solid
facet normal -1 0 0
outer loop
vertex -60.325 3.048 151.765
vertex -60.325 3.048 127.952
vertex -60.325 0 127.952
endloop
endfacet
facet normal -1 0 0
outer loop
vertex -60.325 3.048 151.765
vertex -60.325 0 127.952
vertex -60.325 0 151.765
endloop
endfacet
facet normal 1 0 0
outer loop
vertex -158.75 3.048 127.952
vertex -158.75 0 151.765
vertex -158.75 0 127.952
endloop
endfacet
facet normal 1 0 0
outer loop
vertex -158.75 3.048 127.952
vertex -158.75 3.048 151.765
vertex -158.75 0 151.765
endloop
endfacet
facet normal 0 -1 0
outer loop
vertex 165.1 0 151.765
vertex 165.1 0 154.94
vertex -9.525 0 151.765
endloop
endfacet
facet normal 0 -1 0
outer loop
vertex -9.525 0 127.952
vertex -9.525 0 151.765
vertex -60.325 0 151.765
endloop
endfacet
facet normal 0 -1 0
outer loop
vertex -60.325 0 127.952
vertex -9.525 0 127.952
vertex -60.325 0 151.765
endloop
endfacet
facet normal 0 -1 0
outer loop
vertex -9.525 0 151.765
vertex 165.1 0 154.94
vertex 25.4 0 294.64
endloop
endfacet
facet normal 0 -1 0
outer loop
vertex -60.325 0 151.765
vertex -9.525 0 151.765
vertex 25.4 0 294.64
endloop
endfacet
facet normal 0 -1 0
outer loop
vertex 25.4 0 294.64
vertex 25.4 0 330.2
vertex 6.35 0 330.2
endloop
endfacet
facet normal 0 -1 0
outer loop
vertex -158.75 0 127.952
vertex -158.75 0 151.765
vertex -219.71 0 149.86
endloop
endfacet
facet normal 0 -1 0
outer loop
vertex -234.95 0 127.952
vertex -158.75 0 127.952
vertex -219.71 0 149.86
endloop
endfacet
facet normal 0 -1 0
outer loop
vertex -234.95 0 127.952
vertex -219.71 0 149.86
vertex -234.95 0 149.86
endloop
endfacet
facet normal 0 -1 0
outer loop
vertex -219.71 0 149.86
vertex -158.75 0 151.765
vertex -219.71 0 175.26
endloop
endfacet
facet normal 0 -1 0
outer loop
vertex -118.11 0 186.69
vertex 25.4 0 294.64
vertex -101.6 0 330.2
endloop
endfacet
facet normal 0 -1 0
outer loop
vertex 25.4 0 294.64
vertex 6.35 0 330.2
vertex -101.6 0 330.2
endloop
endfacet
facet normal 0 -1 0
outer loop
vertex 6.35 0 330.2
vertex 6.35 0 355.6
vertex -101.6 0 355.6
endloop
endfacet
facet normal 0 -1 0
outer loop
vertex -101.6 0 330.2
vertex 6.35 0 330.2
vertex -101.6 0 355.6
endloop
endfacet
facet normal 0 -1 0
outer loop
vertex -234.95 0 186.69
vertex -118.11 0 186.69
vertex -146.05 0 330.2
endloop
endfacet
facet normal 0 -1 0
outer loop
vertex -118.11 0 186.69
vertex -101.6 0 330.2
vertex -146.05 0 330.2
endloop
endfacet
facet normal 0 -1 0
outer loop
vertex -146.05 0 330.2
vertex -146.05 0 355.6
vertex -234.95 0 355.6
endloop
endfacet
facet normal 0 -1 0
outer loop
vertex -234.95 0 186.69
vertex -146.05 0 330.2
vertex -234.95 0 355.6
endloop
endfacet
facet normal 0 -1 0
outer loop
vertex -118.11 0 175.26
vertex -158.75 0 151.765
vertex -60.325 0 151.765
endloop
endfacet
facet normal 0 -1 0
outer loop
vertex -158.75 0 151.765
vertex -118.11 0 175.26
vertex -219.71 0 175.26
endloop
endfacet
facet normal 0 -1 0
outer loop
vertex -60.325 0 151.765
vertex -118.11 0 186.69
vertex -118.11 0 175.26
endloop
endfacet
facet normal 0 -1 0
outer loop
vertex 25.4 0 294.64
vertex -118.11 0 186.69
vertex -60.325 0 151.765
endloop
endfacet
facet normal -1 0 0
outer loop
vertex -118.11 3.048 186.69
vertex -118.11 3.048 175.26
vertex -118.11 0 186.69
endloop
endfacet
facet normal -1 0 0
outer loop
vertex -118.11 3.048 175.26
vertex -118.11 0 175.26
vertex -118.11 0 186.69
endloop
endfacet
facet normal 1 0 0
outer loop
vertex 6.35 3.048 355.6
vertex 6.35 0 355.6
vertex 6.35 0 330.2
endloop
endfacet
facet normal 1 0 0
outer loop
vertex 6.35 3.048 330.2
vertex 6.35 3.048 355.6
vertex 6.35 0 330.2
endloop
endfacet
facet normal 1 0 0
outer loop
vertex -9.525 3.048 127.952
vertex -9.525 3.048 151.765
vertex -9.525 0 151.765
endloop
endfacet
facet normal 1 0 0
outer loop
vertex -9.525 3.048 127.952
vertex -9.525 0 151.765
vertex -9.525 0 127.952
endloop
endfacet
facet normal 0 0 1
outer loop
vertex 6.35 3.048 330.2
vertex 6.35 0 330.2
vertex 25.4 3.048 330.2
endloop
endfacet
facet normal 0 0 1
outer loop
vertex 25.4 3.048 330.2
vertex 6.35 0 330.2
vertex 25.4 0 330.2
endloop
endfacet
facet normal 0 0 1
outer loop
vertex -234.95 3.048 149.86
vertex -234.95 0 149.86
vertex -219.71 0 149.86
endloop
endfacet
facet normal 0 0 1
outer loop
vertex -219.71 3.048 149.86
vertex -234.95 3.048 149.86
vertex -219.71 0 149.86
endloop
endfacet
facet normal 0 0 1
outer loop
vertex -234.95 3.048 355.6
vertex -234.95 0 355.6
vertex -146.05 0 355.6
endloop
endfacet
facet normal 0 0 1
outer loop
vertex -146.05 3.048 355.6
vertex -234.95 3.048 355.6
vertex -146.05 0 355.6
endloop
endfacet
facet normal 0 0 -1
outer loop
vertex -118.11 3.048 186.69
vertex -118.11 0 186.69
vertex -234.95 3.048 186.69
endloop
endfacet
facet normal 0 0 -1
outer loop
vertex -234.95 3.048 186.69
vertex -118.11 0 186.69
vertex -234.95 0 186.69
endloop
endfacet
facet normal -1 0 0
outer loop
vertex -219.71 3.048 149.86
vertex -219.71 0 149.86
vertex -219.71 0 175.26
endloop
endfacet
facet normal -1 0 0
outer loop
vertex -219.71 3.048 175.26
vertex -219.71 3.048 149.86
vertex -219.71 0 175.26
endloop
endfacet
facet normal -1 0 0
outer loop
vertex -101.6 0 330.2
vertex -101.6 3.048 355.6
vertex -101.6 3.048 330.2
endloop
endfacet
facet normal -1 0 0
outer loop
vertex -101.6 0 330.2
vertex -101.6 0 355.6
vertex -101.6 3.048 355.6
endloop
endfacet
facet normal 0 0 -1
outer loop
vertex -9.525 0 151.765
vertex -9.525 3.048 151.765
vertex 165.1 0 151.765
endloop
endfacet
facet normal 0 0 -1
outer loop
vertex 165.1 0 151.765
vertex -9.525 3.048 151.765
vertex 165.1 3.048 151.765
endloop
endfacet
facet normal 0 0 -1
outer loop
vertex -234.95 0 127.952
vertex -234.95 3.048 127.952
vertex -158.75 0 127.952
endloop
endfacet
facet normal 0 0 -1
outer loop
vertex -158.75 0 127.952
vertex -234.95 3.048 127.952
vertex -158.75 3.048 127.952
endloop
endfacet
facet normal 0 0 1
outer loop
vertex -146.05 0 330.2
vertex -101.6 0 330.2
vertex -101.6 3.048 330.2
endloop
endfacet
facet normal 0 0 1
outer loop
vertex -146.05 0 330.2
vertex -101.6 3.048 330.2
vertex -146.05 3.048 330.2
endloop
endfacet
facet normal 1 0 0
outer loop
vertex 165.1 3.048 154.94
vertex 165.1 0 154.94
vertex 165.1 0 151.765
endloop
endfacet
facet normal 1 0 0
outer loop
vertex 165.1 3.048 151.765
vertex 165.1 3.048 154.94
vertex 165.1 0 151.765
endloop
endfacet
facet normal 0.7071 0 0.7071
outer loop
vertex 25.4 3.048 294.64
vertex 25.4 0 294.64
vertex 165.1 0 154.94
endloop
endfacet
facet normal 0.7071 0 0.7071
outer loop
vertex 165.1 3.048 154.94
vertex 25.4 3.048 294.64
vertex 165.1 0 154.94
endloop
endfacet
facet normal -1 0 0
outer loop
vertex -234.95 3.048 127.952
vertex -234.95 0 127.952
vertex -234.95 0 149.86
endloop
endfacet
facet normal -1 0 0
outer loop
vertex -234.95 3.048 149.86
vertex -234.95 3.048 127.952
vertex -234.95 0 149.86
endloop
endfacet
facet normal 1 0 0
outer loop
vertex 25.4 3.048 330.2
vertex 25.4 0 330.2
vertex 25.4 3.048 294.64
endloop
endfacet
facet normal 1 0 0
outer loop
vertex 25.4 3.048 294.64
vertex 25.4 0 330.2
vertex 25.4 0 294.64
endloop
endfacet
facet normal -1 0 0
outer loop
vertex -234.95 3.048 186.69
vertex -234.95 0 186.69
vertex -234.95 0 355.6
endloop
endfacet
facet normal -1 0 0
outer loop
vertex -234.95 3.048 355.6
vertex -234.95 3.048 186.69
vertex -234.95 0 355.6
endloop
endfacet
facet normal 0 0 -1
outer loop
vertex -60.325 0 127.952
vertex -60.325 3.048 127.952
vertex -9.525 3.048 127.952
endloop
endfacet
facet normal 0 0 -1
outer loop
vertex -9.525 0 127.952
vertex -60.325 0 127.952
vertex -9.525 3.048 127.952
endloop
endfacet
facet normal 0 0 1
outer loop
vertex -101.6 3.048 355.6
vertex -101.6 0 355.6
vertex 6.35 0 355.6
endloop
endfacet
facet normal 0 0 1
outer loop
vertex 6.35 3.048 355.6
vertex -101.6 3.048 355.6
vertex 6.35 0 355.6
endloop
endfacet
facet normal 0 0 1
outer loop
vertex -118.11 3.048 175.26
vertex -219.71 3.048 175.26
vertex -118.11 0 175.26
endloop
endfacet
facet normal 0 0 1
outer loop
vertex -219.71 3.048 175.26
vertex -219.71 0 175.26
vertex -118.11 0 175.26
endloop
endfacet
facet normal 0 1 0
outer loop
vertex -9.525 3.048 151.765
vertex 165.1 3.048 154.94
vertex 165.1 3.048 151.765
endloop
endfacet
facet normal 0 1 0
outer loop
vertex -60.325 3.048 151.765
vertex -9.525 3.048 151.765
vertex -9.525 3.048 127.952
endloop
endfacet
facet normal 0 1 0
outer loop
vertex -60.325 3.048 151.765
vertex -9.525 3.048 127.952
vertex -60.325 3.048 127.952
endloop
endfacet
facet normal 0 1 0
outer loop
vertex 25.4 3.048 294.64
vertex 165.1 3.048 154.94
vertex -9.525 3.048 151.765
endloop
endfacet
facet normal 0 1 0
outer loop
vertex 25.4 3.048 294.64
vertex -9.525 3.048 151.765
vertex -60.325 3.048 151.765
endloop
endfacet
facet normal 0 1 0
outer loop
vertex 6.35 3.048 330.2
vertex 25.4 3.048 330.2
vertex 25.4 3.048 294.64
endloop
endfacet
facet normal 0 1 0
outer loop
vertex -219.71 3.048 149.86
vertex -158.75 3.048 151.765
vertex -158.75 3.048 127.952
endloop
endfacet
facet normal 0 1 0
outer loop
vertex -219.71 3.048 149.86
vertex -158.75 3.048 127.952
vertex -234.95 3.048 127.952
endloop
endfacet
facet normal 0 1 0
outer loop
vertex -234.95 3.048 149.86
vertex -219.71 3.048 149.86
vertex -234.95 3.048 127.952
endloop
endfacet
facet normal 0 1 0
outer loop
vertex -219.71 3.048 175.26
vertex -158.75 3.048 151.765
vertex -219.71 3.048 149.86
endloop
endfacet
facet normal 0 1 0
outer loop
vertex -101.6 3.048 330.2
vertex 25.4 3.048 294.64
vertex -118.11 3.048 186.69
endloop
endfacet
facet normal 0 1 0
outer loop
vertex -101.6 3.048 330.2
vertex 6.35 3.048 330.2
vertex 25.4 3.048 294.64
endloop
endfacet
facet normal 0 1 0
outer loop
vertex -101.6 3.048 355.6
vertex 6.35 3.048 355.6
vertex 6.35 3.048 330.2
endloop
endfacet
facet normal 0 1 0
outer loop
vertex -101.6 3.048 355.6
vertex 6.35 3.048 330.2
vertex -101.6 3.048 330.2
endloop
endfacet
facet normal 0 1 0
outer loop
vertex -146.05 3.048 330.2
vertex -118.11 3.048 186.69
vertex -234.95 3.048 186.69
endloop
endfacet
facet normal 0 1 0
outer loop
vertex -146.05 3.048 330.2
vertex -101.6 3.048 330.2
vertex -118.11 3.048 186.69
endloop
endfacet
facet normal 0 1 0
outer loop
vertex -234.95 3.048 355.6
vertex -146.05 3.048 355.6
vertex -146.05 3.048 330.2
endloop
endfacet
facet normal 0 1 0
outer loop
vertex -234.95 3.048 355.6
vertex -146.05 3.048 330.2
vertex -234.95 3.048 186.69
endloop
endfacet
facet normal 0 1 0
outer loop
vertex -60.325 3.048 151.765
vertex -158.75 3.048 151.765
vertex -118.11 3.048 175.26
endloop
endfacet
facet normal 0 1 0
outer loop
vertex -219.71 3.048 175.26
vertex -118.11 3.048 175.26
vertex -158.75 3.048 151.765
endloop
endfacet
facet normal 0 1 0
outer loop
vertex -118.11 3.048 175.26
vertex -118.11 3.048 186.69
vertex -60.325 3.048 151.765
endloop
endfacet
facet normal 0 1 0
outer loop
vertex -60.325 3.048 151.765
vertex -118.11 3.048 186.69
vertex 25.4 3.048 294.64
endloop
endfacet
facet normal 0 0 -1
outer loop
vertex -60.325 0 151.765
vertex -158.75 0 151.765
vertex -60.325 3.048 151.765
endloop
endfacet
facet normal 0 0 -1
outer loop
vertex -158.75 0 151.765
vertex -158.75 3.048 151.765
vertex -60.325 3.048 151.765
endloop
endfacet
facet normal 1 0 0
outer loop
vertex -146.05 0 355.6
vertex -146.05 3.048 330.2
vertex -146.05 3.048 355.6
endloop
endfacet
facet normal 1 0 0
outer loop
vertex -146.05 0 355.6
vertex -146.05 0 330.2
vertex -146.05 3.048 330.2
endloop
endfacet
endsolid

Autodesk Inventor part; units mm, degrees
ref_plane "YZ Plane" through (0, 0, 0) normal (1, 0, 0) x (0, 1, 0)
ref_plane "XZ Plane" through (0, 0, 0) normal (0, 1, 0) x (-1, 0, 0)
ref_plane "XY Plane" through (0, 0, 0) normal (0, 0, 1) x (1, 0, 0)
sketch "Sketch1" plane through (0, 0, 0) normal (0, 1, 0) x (-1, 0, 0)
  line L0 (234.95, 355.6) -> (-234.95, 355.6)
  line L1 (-234.95, 355.6) -> (-234.95, -355.6)
  line L2 (-234.95, -355.6) -> (234.95, -355.6)
  line L3 (234.95, -355.6) -> (234.95, 355.6)
  line L4 (234.95, 355.6) -> (-234.95, -355.6) construction
  line L5 (-234.95, 355.6) -> (234.95, -355.6) construction
  point P0 (0, 0)
  dimension "d0" = 469.9
  dimension "d1" = 711.2
extrude "Plate1" add sketch "Sketch1" along normal blind 3.048
sketch "Sketch3" plane through (0, 3.048, 0) normal (0, 1, 0) x (1, 0, 0)
  line L0 (234.95, -355.6) -> (-234.95, -355.6) projected
  point P0 (0, 0)
sketch "Sketch4" plane through (0, 0, 0) normal (0, -1, 0) x (1, 0, 0)
  line L0 (-234.95, 355.6) -> (234.95, 355.6) projected
  line L1 (-234.95, -355.6) -> (-234.95, 355.6) projected
  line L2 (234.95, -355.6) -> (-234.95, -355.6) projected
  line L3 (234.95, 355.6) -> (234.95, -355.6) projected
  line L4 (-234.95, 355.6) -> (234.95, 355.6) projected
  line L5 (25.4, 355.6) -> (25.4, 294.64)
  line L6 (165.1, 101.6) -> (234.95, 101.6)
  line L7 (234.95, 355.6) -> (234.95, -355.6) projected
  line L8 (25.4, 294.64) -> (165.1, 154.94)
  line L9 (25.4, 294.64) -> (222.9656, 294.64) construction
  line L10 (165.1, 154.94) -> (165.1, 101.6)
  line L11 (234.95, 0) -> (-234.95, 0)
  line L12 (-234.95, -355.6) -> (-234.95, 355.6) projected
  line L13 (25.4, -355.6) -> (25.4, -294.64)
  line L14 (165.1, -127) -> (234.95, -127)
  line L15 (25.4, -294.64) -> (165.1, -154.94)
  line L16 (25.4, -294.64) -> (222.9656, -294.64) construction
  line L17 (165.1, -154.94) -> (165.1, -127)
  line L18 (-234.95, 184.15) -> (-120.65, 184.15)
  line L19 (-120.65, 184.15) -> (-120.65, 177.8)
  line L20 (-120.65, 177.8) -> (-222.25, 177.8)
  line L21 (-222.25, 177.8) -> (-222.25, 152.4)
  line L22 (-222.25, 152.4) -> (-234.95, 152.4)
  line L23 (-234.95, 149.86) -> (-219.71, 149.86)
  line L24 (-219.71, 149.86) -> (-219.71, 175.26)
  line L25 (-219.71, 175.26) -> (-118.11, 175.26)
  line L26 (-118.11, 175.26) -> (-118.11, 186.69)
  line L27 (-118.11, 186.69) -> (-234.95, 186.69)
  line L28 (165.1, -129.54) -> (20.32, -129.54)
  line L29 (20.32, -129.54) -> (20.32, 88.9)
  line L30 (20.32, 88.9) -> (165.1, 88.9)
  line L31 (165.1, 101.6) -> (165.1, 88.9)
  line L32 (-234.95, -184.15) -> (-120.65, -184.15)
  line L33 (-120.65, -184.15) -> (-120.65, -177.8)
  line L34 (-120.65, -177.8) -> (-222.25, -177.8)
  line L35 (-222.25, -177.8) -> (-222.25, -152.4)
  line L36 (-222.25, -152.4) -> (-234.95, -152.4)
  line L37 (-234.95, -149.86) -> (-219.71, -149.86)
  line L38 (-219.71, -149.86) -> (-219.71, -175.26)
  line L39 (-219.71, -175.26) -> (-118.11, -175.26)
  line L40 (-118.11, -175.26) -> (-118.11, -186.69)
  line L41 (-118.11, -186.69) -> (-234.95, -186.69)
  line L42 (-158.75, 35.56) -> (-158.75, -43.18)
  line L43 (-158.75, -43.18) -> (-234.95, -43.18)
  line L44 (-158.75, 35.56) -> (-234.95, 35.56)
  line L45 (25.4, 330.2) -> (6.35, 330.2)
  line L46 (6.35, 330.2) -> (6.35, 355.6)
  line L47 (25.4, -330.2) -> (6.35, -330.2)
  line L48 (6.35, -330.2) -> (6.35, -355.6)
  line L49 (234.95, -355.6) -> (-234.95, -355.6) projected
  point P0 (0, 0)
  dimension "d3" = 209.55
  dimension "d4" = 254
  dimension "d5" = 45
  dimension "d6" = 60.96
  dimension "d9" = 69.85
  dimension "d12" = 45
  dimension "d13" = 209.55
  dimension "d14" = 228.6
  dimension "d15" = 69.85
  dimension "d16" = 60.96
  dimension "d17" = 171.45
  dimension "d18" = 114.3
  dimension "d19" = 6.35
  dimension "d21" = 101.6
  dimension "d22" = 25.4
  dimension "d23" = 2.54
  dimension "d26" = 144.78
  dimension "d31" = 12.7
  dimension "d32" = 114.3
  dimension "d33" = 171.45
  dimension "d34" = 6.35
  dimension "d35" = 101.6
  dimension "d36" = 25.4
  dimension "d37" = 2.54
  dimension "d38" = 76.2
  dimension "d39" = 35.56
  dimension "d40" = 43.18
  dimension "d41" = 2.54
  dimension "d42" = 25.4
  dimension "d43" = 19.05
  dimension "d44" = 25.4
  dimension "d45" = 19.05
extrude "Cut1" cut sketch "Sketch4" against normal blind 3.048 contours L27 L26 L25 L24 L23 L1 L22 L21 L20 L19 L18 | L0 L3 L6 L10 L8 L5 | L18 L19 L20 L21 L22 L1 | L3 L11 L29 L30 L31 L6 | L3 L14 L17 L28 L29 L11 | L44 L42 L11 L1 | L3 L2 L13 L15 L17 L14 | L11 L42 L43 L1 | L37 L38 L39 L40 L41 L1 L32 L33 L34 L35 L36 | L36 L35 L34 L33 L32 L1
sketch "Sketch5" plane through (0, 0, 0) normal (0, -1, 0) x (1, 0, 0)
  line L0 (25.4, 355.6) -> (25.4, 294.64) projected
  line L1 (25.4, 294.64) -> (165.1, 154.94) projected
  line L2 (165.1, 154.94) -> (165.1, 88.9) projected
  line L3 (165.1, 88.9) -> (20.32, 88.9) projected
  line L4 (20.32, 88.9) -> (20.32, -129.54) projected
  line L5 (20.32, -129.54) -> (165.1, -129.54) projected
  line L6 (165.1, -129.54) -> (165.1, -154.94) projected
  line L7 (165.1, -154.94) -> (25.4, -294.64) projected
  line L8 (25.4, -294.64) -> (25.4, -355.6) projected
  line L9 (25.4, -355.6) -> (-234.95, -355.6) projected
  line L10 (-234.95, -355.6) -> (-234.95, -186.69) projected
  line L11 (-234.95, -186.69) -> (-118.11, -186.69) projected
  line L12 (-118.11, -186.69) -> (-118.11, -175.26) projected
  line L13 (-118.11, -175.26) -> (-219.71, -175.26) projected
  line L14 (-219.71, -175.26) -> (-219.71, -149.86) projected
  line L15 (-219.71, -149.86) -> (-234.95, -149.86) projected
  line L16 (-234.95, -149.86) -> (-234.95, -43.18) projected
  line L17 (-234.95, -43.18) -> (-158.75, -43.18) projected
  line L18 (-158.75, -43.18) -> (-158.75, 35.56) projected
  line L19 (-158.75, 35.56) -> (-234.95, 35.56) projected
  line L20 (-234.95, 35.56) -> (-234.95, 149.86) projected
  line L21 (-234.95, 149.86) -> (-219.71, 149.86) projected
  line L22 (-219.71, 149.86) -> (-219.71, 175.26) projected
  line L23 (-219.71, 175.26) -> (-118.11, 175.26) projected
  line L24 (-118.11, 175.26) -> (-118.11, 186.69) projected
  line L25 (-118.11, 186.69) -> (-234.95, 186.69) projected
  line L26 (-234.95, 186.69) -> (-234.95, 355.6) projected
  line L27 (-234.95, 355.6) -> (25.4, 355.6) projected
  line L28 (25.4, -355.6) -> (-234.95, -355.6) projected
  line L29 (25.4, -355.6) -> (6.35, -355.6)
  line L30 (6.35, -355.6) -> (6.35, -330.2)
  line L31 (6.35, -330.2) -> (25.4, -330.2)
  line L32 (25.4, -330.2) -> (25.4, -355.6)
  line L33 (-234.95, 355.6) -> (25.4, 355.6) projected
  line L34 (25.4, 355.6) -> (6.35, 355.6)
  line L35 (6.35, 355.6) -> (6.35, 330.2)
  line L36 (6.35, 330.2) -> (25.4, 330.2)
  line L37 (25.4, 330.2) -> (25.4, 355.6)
  line L38 (-146.05, -355.6) -> (-101.6, -355.6)
  line L39 (-101.6, -355.6) -> (-101.6, -330.2)
  line L40 (-101.6, -330.2) -> (-146.05, -330.2)
  line L41 (-146.05, -330.2) -> (-146.05, -355.6)
  line L42 (-146.05, 355.6) -> (-101.6, 355.6)
  line L43 (-101.6, 355.6) -> (-101.6, 330.2)
  line L44 (-101.6, 330.2) -> (-146.05, 330.2)
  line L45 (-146.05, 330.2) -> (-146.05, 355.6)
  point P0 (0, 0)
  dimension "d46" = 19.05
  dimension "d47" = 25.4
  dimension "d48" = 19.05
  dimension "d49" = 25.4
  dimension "d52" = 44.45
  dimension "d53" = 25.4
  dimension "d54" = 88.9
  dimension "d55" = 44.45
  dimension "d56" = 25.4
  dimension "d57" = 88.9
extrude "Cut2" cut sketch "Sketch5" against normal blind 3.048 contours L0 L36 L35 L27 | L43 L44 L45 L27 | L8 L9 L30 L31 | L9 L41 L40 L39
sketch "Sketch6" plane through (0, 3.048, 0) normal (0, 1, 0) x (1, 0, 0)
  line L0 (20.32, -88.9) -> (165.1, -88.9) projected
  line L1 (165.1, -88.9) -> (165.1, -154.94) projected
  line L2 (165.1, -154.94) -> (25.4, -294.64) projected
  line L3 (25.4, -294.64) -> (25.4, -330.2) projected
  line L4 (25.4, -330.2) -> (6.35, -330.2) projected
  line L5 (6.35, -330.2) -> (6.35, -355.6) projected
  line L6 (6.35, -355.6) -> (-101.6, -355.6) projected
  line L7 (-101.6, -355.6) -> (-101.6, -330.2) projected
  line L8 (-101.6, -330.2) -> (-146.05, -330.2) projected
  line L9 (-146.05, -330.2) -> (-146.05, -355.6) projected
  line L10 (-146.05, -355.6) -> (-234.95, -355.6) projected
  line L11 (-234.95, -355.6) -> (-234.95, -186.69) projected
  line L12 (-234.95, -186.69) -> (-118.11, -186.69) projected
  line L13 (-118.11, -186.69) -> (-118.11, -175.26) projected
  line L14 (-118.11, -175.26) -> (-219.71, -175.26) projected
  line L15 (-219.71, -175.26) -> (-219.71, -149.86) projected
  line L16 (-219.71, -149.86) -> (-234.95, -149.86) projected
  line L17 (-234.95, -149.86) -> (-234.95, -35.56) projected
  line L18 (-234.95, -35.56) -> (-158.75, -35.56) projected
  line L19 (-158.75, -35.56) -> (-158.75, 43.18) projected
  line L20 (-158.75, 43.18) -> (-234.95, 43.18) projected
  line L21 (-234.95, 43.18) -> (-234.95, 149.86) projected
  line L22 (-234.95, 149.86) -> (-219.71, 149.86) projected
  line L23 (-219.71, 149.86) -> (-219.71, 175.26) projected
  line L24 (-219.71, 175.26) -> (-118.11, 175.26) projected
  line L25 (-118.11, 175.26) -> (-118.11, 186.69) projected
  line L26 (-118.11, 186.69) -> (-234.95, 186.69) projected
  line L27 (-234.95, 186.69) -> (-234.95, 355.6) projected
  line L28 (-234.95, 355.6) -> (-146.05, 355.6) projected
  line L29 (-146.05, 355.6) -> (-146.05, 330.2) projected
  line L30 (-146.05, 330.2) -> (-101.6, 330.2) projected
  line L31 (-101.6, 330.2) -> (-101.6, 355.6) projected
  line L32 (-101.6, 355.6) -> (6.35, 355.6) projected
  line L33 (6.35, 355.6) -> (6.35, 330.2) projected
  line L34 (6.35, 330.2) -> (25.4, 330.2) projected
  line L35 (25.4, 330.2) -> (25.4, 294.64) projected
  line L36 (25.4, 294.64) -> (165.1, 154.94) projected
  line L37 (165.1, 154.94) -> (165.1, 129.54) projected
  line L38 (165.1, 129.54) -> (20.32, 129.54) projected
  line L39 (20.32, 129.54) -> (20.32, -88.9) projected
  line L40 (-234.95, -151.765) -> (-158.75, -151.765)
  line L41 (-158.75, -151.765) -> (-158.75, -126.365)
  line L42 (-158.75, -126.365) -> (-234.95, -126.365)
  line L43 (-234.95, -126.365) -> (-234.95, -151.765)
  line L44 (-234.95, -151.765) -> (-158.75, -126.365) construction
  line L45 (-158.75, -151.765) -> (-234.95, -126.365) construction
  line L46 (88.9, -151.765) -> (165.1, -151.765)
  line L47 (165.1, -151.765) -> (165.1, -126.365)
  line L48 (165.1, -126.365) -> (88.9, -126.365)
  line L49 (88.9, -126.365) -> (88.9, -151.765)
  line L50 (88.9, -151.765) -> (165.1, -126.365) construction
  line L51 (165.1, -151.765) -> (88.9, -126.365) construction
  line L52 (165.1, -154.94) -> (165.1, -88.9) projected
  line L53 (-234.95, -149.86) -> (-234.95, -35.56) projected
  line L54 (88.9, 127.635) -> (165.1, 127.635)
  line L55 (165.1, 127.635) -> (165.1, 153.035)
  line L56 (165.1, 153.035) -> (88.9, 153.035)
  line L57 (88.9, 153.035) -> (88.9, 127.635)
  line L58 (88.9, 127.635) -> (165.1, 153.035) construction
  line L59 (165.1, 127.635) -> (88.9, 153.035) construction
  line L60 (-60.325, 127.635) -> (-9.525, 127.635)
  line L61 (-9.525, 127.635) -> (-9.525, 153.035)
  line L62 (-9.525, 153.035) -> (-60.325, 153.035)
  line L63 (-60.325, 153.035) -> (-60.325, 127.635)
  line L64 (-60.325, 127.635) -> (-9.525, 153.035) construction
  line L65 (-9.525, 127.635) -> (-60.325, 153.035) construction
  line L66 (-60.325, -151.765) -> (-9.525, -151.765)
  line L67 (-9.525, -151.765) -> (-9.525, -126.365)
  line L68 (-9.525, -126.365) -> (-60.325, -126.365)
  line L69 (-60.325, -126.365) -> (-60.325, -151.765)
  line L70 (-60.325, -151.765) -> (-9.525, -126.365) construction
  line L71 (-9.525, -151.765) -> (-60.325, -126.365) construction
  line L72 (-196.85, -139.065) -> (127, -139.065) construction
  line L73 (-234.95, 127.635) -> (-158.75, 127.635)
  line L74 (-158.75, 127.635) -> (-158.75, 153.035)
  line L75 (-158.75, 153.035) -> (-234.95, 153.035)
  line L76 (-234.95, 153.035) -> (-234.95, 127.635)
  line L77 (-234.95, 127.635) -> (-158.75, 153.035) construction
  line L78 (-158.75, 127.635) -> (-234.95, 153.035) construction
  line L79 (-158.75, -151.765) -> (88.9, -151.765)
  line L80 (88.9, 153.035) -> (-158.75, 153.035)
  line L81 (-158.75, -126.365) -> (88.9, -126.365)
  line L82 (-158.75, 127.635) -> (88.9, 127.635)
  line L83 (165.1, 129.54) -> (20.32, 129.54) construction
  line L84 (-6.35, -151.765) -> (-6.35, -126.365)
  line L85 (85.725, -151.765) -> (85.725, -126.365)
  line L86 (-155.575, -151.765) -> (-155.575, -126.365)
  line L87 (-63.5, -151.765) -> (-63.5, -126.365)
  line L88 (-63.5, 127.635) -> (-63.5, 153.035)
  line L89 (-6.35, 127.635) -> (-6.35, 153.035)
  line L90 (85.725, 127.635) -> (85.725, 153.035)
  line L91 (-155.575, 127.635) -> (-155.575, 153.035)
  line L92 (-234.95, -35.56) -> (-234.95, -149.86) construction
  line L93 (-234.95, -127.9525) -> (165.1, -127.9525)
  line L94 (165.1, -88.9) -> (165.1, -154.94) construction
  point P0 (0, 0)
  point P1 (127, 140.335)
  point P2 (-34.925, 140.335)
  point P3 (-34.925, -139.065)
  point P4 (-34.925, -139.065)
  point P5 (-196.85, 140.335)
  point P6 (-9.525, -151.765)
  point P7 (-219.71, -151.765)
  point P8 (-60.325, -126.365)
  point P9 (-60.325, -126.365)
  point P10 (-158.75, -127.9525)
  point P11 (-60.325, -127.9525)
  point P12 (-9.525, -127.9525)
  dimension "d58" = 25.4
  dimension "d59" = 3.175
  dimension "d60" = 76.2
  dimension "d61" = 50.8
  dimension "d62" = 279.4
  dimension "d65" = 3.175
  dimension "d66" = 3.175
  dimension "d67" = 3.175
  dimension "d68" = 3.175
  dimension "d69" = 3.175
  dimension "d70" = 3.175
  dimension "d71" = 3.175
  dimension "d72" = 3.175
  dimension "d73" = 1.5875
extrude "Extrusion1" cut sketch "Sketch6" against normal through all contours L0 L1 L48 L81 L68 L42 L17 L18 L19 L20 L21 L73 L82 L60 L39 | L82 L89 L80 L90 L38 L39 | L1 L93 L49 L48 | L82 L61 L80 L89 | L1 L46 L49 L93 | L49 L93 L85 L81 | L90 L80 L57 L38 | L60 L63 L62 L61 | L80 L62 L75 L23 L24 L25 L26 L27 L28 L29 L30 L31 L32 L33 L34 L35 L36 L37 L56 | L49 L79 L85 L93 | L85 L93 L84 L81 | L57 L56 L37 L38 | L82 L88 L80 L63 | L85 L79 L84 L93 | L84 L93 L67 L81 | L82 L91 L80 L88 | L84 L79 L67 L93 | L67 L93 L69 L68 | L82 L74 L80 L91 | L69 L93 L87 L81 | L73 L21 L22 L23 L75 L74 | L69 L79 L87 L93 | L87 L93 L86 L81 | L87 L79 L86 L93 | L86 L93 L41 L81 | L86 L79 L41 L93 | L41 L93 L17 L42
equation "\"d10\" = Thickness"
equation "\"d2\" = Thickness"
equation "\"BendRadius\" = Thickness"
equation "\"BendReliefWidth\" = Thickness"
equation "\"BendReliefDepth\" = 0.5 * Thickness"
equation "\"CornerReliefSize\" = 4 * Thickness"
equation "\"MinimumRemnant\" = 2 * Thickness"
equation "\"TransitionRadius\" = BendRadius"
equation "\"JacobiRadiusSize\" = BendRadius"
equation "\"GapSize\" = Thickness"
equation "\"Thickness\" = 3.048"
properties part number "DB1-021" material "Polycarbonate, Smoke"
